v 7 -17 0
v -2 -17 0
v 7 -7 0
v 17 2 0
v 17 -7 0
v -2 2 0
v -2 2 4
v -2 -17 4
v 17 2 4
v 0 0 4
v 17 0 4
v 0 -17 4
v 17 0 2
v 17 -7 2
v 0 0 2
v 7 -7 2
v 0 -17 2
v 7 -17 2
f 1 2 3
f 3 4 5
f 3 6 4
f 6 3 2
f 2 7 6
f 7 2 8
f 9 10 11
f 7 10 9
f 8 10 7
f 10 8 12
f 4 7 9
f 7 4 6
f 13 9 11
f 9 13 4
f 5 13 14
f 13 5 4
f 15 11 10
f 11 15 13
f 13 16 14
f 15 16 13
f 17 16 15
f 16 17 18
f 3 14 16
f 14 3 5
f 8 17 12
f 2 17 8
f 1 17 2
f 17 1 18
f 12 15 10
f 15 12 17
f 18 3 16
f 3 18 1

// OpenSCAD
lip = 2;
inset = 7;
width = 10;

module edge() {
  linear_extrude(lip * 2)
    translate([-lip, 0]) square([lip + width + inset, lip]);
  linear_extrude(lip)
    translate([-lip, -inset]) square([lip + width + inset, lip + inset]);
}

edge();
mirror([1, 1]) edge();
